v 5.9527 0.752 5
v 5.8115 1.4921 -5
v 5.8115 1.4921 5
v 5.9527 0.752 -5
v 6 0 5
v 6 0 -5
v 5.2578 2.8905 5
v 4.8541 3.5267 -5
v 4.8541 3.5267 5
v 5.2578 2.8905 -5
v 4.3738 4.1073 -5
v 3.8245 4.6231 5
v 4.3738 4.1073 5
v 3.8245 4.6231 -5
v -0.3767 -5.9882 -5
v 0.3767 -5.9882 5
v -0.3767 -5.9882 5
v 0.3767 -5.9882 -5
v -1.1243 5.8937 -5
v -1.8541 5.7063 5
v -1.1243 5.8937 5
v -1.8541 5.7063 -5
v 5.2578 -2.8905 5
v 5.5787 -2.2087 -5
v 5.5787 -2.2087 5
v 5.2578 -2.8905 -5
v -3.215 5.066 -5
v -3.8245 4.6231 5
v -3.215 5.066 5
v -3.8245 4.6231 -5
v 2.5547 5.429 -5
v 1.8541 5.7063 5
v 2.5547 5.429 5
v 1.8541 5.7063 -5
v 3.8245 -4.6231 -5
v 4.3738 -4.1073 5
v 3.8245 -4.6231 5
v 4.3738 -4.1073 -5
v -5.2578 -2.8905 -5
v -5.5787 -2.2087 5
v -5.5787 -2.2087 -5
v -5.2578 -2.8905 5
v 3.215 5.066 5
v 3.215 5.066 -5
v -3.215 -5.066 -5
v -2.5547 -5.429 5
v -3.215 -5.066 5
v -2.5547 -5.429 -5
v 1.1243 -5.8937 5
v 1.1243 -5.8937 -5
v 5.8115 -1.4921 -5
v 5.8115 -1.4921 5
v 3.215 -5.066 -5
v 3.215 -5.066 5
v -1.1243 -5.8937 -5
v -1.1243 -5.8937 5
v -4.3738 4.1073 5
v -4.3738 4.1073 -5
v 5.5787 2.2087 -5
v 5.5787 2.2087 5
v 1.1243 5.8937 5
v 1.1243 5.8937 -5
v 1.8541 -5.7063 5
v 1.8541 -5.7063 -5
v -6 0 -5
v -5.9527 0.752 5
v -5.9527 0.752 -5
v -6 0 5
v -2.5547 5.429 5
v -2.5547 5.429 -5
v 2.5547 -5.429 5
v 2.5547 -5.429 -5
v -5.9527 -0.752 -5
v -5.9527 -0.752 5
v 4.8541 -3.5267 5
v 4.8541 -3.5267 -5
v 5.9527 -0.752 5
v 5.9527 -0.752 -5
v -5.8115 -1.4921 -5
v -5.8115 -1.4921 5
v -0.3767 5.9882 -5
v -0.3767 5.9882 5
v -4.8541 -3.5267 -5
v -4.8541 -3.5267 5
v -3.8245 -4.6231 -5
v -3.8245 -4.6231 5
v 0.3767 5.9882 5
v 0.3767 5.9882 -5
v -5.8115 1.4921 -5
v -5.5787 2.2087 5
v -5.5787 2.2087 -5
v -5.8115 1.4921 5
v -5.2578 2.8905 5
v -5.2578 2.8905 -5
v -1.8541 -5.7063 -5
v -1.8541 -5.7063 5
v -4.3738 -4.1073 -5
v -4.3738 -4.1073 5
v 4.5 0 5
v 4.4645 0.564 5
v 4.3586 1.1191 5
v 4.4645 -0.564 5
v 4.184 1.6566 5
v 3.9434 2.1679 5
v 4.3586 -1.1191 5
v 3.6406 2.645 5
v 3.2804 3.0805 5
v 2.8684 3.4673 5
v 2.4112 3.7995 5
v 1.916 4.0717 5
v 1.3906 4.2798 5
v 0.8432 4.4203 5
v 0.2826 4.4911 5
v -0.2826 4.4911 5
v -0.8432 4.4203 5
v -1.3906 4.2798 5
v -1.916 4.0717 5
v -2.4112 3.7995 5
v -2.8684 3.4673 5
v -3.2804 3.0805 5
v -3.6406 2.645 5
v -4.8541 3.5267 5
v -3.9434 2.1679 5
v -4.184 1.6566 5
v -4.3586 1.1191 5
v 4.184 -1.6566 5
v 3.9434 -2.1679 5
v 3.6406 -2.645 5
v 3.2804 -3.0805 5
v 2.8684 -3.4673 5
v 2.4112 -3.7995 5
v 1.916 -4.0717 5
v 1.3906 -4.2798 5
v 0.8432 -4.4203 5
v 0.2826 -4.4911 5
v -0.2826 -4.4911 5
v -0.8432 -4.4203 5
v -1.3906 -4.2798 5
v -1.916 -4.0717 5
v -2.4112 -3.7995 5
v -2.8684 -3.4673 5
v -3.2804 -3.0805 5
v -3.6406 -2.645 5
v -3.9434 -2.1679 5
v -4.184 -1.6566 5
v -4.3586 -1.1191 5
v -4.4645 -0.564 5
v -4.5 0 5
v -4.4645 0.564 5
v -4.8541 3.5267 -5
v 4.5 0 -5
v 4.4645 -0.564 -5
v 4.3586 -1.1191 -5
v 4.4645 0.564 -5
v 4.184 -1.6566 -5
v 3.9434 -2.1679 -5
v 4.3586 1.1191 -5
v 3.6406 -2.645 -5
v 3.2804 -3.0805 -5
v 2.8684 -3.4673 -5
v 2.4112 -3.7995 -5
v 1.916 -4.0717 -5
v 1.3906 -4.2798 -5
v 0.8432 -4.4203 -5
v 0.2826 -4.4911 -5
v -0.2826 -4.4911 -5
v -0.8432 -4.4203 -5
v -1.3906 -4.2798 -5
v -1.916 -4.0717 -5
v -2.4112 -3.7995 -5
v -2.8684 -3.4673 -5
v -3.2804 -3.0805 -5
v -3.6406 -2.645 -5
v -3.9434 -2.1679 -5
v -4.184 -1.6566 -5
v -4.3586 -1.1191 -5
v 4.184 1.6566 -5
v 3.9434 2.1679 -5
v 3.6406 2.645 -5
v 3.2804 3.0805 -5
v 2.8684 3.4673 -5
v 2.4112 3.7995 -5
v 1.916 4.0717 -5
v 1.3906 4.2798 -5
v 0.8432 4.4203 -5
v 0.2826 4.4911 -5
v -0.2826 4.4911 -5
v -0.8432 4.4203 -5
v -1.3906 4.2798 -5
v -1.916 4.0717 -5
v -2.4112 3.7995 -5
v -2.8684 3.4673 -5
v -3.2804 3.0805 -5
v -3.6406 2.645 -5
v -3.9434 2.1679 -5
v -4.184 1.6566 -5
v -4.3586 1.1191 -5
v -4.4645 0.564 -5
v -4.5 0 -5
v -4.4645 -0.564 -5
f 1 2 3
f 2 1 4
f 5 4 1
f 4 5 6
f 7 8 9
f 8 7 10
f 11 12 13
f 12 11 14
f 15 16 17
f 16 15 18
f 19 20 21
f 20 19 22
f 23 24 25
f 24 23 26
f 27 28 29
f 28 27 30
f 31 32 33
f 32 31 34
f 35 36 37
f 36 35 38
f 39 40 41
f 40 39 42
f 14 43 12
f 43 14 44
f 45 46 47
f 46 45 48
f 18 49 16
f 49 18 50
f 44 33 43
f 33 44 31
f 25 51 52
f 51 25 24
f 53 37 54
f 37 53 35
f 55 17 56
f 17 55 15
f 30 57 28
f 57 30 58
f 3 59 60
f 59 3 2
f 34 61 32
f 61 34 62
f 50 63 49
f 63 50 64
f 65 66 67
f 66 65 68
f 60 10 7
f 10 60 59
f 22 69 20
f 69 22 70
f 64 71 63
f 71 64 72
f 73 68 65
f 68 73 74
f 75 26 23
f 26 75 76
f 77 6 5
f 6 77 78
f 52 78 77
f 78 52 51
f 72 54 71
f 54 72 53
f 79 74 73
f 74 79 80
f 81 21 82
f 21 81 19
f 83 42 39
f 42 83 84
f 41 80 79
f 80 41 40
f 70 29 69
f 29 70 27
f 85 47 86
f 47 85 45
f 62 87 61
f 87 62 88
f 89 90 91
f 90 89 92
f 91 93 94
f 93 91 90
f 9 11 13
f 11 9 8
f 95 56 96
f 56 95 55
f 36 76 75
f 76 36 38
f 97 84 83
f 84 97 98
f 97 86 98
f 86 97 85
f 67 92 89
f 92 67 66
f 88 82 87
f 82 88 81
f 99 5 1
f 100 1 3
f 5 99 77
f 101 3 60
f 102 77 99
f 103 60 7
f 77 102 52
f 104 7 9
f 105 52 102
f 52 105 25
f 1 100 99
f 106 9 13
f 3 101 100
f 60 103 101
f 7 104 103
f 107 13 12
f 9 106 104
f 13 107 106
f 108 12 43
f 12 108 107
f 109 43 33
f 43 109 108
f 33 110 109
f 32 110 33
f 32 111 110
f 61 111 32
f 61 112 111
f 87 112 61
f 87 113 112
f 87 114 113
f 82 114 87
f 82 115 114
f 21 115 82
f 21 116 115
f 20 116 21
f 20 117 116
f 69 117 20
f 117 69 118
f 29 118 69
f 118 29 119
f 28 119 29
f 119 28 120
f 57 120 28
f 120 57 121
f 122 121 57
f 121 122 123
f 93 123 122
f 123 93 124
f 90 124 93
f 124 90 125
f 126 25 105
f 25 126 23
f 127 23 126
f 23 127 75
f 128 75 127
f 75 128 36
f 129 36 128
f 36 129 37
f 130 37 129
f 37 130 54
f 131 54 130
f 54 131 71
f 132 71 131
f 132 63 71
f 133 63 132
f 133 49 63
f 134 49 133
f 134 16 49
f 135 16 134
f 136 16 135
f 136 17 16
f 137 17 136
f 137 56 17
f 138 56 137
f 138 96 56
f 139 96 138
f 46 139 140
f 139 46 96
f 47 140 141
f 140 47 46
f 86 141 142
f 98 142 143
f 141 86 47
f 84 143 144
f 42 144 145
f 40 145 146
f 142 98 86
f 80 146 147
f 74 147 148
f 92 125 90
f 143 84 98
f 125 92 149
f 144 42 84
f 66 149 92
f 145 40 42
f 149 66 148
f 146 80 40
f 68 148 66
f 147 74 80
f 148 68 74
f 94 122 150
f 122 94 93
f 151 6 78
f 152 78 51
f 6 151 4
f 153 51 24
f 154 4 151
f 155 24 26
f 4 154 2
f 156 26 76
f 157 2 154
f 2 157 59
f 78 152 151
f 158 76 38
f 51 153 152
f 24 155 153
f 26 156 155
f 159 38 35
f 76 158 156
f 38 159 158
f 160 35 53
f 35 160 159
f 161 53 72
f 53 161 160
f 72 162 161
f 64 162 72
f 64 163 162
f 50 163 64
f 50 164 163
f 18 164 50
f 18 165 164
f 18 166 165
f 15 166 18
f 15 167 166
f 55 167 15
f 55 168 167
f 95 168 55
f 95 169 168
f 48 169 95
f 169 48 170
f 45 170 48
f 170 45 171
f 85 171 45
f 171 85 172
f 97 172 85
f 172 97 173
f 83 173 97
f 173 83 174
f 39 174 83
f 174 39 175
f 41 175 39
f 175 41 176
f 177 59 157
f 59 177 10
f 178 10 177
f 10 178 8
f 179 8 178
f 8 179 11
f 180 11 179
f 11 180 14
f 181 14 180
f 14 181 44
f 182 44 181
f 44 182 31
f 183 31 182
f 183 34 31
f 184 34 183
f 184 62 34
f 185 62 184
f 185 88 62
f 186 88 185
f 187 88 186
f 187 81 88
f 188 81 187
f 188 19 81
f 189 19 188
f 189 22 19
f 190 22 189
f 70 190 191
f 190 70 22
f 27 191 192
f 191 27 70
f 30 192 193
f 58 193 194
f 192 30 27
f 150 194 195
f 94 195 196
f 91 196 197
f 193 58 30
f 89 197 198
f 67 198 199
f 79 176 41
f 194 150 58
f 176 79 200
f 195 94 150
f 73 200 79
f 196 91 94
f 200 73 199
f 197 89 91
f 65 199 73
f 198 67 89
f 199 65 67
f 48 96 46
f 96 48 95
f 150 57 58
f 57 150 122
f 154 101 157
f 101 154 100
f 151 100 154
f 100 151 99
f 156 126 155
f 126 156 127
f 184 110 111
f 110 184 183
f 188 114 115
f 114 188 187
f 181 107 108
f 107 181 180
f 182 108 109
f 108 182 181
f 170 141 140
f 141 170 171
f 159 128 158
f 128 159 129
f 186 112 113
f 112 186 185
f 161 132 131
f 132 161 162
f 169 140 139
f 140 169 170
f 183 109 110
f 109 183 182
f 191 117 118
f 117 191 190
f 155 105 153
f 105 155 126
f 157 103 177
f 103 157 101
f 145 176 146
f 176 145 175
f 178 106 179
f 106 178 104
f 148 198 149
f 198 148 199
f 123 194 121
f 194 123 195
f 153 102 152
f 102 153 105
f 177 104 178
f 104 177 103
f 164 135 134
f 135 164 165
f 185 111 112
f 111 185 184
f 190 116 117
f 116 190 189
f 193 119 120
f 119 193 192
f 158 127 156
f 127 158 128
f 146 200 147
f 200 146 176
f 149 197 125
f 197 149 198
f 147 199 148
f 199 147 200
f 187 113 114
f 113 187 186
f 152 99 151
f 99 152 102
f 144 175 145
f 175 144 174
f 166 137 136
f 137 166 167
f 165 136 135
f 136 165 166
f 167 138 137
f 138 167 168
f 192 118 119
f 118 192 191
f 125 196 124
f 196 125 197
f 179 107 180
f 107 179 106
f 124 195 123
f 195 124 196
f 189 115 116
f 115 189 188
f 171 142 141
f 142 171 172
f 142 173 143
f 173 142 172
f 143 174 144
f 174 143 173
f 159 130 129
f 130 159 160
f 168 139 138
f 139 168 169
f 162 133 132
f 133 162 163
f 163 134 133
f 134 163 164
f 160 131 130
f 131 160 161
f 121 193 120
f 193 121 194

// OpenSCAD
$fn = 50;


difference() {
	union() {
		translate(v = [0, 0, -5.0000000000]) {
			cylinder(h = 10, r = 6.0000000000);
		}
	}
	union() {
		translate(v = [0, 0, -100.0000000000]) {
			cylinder(h = 200, r = 4.5000000000);
		}
	}
}
